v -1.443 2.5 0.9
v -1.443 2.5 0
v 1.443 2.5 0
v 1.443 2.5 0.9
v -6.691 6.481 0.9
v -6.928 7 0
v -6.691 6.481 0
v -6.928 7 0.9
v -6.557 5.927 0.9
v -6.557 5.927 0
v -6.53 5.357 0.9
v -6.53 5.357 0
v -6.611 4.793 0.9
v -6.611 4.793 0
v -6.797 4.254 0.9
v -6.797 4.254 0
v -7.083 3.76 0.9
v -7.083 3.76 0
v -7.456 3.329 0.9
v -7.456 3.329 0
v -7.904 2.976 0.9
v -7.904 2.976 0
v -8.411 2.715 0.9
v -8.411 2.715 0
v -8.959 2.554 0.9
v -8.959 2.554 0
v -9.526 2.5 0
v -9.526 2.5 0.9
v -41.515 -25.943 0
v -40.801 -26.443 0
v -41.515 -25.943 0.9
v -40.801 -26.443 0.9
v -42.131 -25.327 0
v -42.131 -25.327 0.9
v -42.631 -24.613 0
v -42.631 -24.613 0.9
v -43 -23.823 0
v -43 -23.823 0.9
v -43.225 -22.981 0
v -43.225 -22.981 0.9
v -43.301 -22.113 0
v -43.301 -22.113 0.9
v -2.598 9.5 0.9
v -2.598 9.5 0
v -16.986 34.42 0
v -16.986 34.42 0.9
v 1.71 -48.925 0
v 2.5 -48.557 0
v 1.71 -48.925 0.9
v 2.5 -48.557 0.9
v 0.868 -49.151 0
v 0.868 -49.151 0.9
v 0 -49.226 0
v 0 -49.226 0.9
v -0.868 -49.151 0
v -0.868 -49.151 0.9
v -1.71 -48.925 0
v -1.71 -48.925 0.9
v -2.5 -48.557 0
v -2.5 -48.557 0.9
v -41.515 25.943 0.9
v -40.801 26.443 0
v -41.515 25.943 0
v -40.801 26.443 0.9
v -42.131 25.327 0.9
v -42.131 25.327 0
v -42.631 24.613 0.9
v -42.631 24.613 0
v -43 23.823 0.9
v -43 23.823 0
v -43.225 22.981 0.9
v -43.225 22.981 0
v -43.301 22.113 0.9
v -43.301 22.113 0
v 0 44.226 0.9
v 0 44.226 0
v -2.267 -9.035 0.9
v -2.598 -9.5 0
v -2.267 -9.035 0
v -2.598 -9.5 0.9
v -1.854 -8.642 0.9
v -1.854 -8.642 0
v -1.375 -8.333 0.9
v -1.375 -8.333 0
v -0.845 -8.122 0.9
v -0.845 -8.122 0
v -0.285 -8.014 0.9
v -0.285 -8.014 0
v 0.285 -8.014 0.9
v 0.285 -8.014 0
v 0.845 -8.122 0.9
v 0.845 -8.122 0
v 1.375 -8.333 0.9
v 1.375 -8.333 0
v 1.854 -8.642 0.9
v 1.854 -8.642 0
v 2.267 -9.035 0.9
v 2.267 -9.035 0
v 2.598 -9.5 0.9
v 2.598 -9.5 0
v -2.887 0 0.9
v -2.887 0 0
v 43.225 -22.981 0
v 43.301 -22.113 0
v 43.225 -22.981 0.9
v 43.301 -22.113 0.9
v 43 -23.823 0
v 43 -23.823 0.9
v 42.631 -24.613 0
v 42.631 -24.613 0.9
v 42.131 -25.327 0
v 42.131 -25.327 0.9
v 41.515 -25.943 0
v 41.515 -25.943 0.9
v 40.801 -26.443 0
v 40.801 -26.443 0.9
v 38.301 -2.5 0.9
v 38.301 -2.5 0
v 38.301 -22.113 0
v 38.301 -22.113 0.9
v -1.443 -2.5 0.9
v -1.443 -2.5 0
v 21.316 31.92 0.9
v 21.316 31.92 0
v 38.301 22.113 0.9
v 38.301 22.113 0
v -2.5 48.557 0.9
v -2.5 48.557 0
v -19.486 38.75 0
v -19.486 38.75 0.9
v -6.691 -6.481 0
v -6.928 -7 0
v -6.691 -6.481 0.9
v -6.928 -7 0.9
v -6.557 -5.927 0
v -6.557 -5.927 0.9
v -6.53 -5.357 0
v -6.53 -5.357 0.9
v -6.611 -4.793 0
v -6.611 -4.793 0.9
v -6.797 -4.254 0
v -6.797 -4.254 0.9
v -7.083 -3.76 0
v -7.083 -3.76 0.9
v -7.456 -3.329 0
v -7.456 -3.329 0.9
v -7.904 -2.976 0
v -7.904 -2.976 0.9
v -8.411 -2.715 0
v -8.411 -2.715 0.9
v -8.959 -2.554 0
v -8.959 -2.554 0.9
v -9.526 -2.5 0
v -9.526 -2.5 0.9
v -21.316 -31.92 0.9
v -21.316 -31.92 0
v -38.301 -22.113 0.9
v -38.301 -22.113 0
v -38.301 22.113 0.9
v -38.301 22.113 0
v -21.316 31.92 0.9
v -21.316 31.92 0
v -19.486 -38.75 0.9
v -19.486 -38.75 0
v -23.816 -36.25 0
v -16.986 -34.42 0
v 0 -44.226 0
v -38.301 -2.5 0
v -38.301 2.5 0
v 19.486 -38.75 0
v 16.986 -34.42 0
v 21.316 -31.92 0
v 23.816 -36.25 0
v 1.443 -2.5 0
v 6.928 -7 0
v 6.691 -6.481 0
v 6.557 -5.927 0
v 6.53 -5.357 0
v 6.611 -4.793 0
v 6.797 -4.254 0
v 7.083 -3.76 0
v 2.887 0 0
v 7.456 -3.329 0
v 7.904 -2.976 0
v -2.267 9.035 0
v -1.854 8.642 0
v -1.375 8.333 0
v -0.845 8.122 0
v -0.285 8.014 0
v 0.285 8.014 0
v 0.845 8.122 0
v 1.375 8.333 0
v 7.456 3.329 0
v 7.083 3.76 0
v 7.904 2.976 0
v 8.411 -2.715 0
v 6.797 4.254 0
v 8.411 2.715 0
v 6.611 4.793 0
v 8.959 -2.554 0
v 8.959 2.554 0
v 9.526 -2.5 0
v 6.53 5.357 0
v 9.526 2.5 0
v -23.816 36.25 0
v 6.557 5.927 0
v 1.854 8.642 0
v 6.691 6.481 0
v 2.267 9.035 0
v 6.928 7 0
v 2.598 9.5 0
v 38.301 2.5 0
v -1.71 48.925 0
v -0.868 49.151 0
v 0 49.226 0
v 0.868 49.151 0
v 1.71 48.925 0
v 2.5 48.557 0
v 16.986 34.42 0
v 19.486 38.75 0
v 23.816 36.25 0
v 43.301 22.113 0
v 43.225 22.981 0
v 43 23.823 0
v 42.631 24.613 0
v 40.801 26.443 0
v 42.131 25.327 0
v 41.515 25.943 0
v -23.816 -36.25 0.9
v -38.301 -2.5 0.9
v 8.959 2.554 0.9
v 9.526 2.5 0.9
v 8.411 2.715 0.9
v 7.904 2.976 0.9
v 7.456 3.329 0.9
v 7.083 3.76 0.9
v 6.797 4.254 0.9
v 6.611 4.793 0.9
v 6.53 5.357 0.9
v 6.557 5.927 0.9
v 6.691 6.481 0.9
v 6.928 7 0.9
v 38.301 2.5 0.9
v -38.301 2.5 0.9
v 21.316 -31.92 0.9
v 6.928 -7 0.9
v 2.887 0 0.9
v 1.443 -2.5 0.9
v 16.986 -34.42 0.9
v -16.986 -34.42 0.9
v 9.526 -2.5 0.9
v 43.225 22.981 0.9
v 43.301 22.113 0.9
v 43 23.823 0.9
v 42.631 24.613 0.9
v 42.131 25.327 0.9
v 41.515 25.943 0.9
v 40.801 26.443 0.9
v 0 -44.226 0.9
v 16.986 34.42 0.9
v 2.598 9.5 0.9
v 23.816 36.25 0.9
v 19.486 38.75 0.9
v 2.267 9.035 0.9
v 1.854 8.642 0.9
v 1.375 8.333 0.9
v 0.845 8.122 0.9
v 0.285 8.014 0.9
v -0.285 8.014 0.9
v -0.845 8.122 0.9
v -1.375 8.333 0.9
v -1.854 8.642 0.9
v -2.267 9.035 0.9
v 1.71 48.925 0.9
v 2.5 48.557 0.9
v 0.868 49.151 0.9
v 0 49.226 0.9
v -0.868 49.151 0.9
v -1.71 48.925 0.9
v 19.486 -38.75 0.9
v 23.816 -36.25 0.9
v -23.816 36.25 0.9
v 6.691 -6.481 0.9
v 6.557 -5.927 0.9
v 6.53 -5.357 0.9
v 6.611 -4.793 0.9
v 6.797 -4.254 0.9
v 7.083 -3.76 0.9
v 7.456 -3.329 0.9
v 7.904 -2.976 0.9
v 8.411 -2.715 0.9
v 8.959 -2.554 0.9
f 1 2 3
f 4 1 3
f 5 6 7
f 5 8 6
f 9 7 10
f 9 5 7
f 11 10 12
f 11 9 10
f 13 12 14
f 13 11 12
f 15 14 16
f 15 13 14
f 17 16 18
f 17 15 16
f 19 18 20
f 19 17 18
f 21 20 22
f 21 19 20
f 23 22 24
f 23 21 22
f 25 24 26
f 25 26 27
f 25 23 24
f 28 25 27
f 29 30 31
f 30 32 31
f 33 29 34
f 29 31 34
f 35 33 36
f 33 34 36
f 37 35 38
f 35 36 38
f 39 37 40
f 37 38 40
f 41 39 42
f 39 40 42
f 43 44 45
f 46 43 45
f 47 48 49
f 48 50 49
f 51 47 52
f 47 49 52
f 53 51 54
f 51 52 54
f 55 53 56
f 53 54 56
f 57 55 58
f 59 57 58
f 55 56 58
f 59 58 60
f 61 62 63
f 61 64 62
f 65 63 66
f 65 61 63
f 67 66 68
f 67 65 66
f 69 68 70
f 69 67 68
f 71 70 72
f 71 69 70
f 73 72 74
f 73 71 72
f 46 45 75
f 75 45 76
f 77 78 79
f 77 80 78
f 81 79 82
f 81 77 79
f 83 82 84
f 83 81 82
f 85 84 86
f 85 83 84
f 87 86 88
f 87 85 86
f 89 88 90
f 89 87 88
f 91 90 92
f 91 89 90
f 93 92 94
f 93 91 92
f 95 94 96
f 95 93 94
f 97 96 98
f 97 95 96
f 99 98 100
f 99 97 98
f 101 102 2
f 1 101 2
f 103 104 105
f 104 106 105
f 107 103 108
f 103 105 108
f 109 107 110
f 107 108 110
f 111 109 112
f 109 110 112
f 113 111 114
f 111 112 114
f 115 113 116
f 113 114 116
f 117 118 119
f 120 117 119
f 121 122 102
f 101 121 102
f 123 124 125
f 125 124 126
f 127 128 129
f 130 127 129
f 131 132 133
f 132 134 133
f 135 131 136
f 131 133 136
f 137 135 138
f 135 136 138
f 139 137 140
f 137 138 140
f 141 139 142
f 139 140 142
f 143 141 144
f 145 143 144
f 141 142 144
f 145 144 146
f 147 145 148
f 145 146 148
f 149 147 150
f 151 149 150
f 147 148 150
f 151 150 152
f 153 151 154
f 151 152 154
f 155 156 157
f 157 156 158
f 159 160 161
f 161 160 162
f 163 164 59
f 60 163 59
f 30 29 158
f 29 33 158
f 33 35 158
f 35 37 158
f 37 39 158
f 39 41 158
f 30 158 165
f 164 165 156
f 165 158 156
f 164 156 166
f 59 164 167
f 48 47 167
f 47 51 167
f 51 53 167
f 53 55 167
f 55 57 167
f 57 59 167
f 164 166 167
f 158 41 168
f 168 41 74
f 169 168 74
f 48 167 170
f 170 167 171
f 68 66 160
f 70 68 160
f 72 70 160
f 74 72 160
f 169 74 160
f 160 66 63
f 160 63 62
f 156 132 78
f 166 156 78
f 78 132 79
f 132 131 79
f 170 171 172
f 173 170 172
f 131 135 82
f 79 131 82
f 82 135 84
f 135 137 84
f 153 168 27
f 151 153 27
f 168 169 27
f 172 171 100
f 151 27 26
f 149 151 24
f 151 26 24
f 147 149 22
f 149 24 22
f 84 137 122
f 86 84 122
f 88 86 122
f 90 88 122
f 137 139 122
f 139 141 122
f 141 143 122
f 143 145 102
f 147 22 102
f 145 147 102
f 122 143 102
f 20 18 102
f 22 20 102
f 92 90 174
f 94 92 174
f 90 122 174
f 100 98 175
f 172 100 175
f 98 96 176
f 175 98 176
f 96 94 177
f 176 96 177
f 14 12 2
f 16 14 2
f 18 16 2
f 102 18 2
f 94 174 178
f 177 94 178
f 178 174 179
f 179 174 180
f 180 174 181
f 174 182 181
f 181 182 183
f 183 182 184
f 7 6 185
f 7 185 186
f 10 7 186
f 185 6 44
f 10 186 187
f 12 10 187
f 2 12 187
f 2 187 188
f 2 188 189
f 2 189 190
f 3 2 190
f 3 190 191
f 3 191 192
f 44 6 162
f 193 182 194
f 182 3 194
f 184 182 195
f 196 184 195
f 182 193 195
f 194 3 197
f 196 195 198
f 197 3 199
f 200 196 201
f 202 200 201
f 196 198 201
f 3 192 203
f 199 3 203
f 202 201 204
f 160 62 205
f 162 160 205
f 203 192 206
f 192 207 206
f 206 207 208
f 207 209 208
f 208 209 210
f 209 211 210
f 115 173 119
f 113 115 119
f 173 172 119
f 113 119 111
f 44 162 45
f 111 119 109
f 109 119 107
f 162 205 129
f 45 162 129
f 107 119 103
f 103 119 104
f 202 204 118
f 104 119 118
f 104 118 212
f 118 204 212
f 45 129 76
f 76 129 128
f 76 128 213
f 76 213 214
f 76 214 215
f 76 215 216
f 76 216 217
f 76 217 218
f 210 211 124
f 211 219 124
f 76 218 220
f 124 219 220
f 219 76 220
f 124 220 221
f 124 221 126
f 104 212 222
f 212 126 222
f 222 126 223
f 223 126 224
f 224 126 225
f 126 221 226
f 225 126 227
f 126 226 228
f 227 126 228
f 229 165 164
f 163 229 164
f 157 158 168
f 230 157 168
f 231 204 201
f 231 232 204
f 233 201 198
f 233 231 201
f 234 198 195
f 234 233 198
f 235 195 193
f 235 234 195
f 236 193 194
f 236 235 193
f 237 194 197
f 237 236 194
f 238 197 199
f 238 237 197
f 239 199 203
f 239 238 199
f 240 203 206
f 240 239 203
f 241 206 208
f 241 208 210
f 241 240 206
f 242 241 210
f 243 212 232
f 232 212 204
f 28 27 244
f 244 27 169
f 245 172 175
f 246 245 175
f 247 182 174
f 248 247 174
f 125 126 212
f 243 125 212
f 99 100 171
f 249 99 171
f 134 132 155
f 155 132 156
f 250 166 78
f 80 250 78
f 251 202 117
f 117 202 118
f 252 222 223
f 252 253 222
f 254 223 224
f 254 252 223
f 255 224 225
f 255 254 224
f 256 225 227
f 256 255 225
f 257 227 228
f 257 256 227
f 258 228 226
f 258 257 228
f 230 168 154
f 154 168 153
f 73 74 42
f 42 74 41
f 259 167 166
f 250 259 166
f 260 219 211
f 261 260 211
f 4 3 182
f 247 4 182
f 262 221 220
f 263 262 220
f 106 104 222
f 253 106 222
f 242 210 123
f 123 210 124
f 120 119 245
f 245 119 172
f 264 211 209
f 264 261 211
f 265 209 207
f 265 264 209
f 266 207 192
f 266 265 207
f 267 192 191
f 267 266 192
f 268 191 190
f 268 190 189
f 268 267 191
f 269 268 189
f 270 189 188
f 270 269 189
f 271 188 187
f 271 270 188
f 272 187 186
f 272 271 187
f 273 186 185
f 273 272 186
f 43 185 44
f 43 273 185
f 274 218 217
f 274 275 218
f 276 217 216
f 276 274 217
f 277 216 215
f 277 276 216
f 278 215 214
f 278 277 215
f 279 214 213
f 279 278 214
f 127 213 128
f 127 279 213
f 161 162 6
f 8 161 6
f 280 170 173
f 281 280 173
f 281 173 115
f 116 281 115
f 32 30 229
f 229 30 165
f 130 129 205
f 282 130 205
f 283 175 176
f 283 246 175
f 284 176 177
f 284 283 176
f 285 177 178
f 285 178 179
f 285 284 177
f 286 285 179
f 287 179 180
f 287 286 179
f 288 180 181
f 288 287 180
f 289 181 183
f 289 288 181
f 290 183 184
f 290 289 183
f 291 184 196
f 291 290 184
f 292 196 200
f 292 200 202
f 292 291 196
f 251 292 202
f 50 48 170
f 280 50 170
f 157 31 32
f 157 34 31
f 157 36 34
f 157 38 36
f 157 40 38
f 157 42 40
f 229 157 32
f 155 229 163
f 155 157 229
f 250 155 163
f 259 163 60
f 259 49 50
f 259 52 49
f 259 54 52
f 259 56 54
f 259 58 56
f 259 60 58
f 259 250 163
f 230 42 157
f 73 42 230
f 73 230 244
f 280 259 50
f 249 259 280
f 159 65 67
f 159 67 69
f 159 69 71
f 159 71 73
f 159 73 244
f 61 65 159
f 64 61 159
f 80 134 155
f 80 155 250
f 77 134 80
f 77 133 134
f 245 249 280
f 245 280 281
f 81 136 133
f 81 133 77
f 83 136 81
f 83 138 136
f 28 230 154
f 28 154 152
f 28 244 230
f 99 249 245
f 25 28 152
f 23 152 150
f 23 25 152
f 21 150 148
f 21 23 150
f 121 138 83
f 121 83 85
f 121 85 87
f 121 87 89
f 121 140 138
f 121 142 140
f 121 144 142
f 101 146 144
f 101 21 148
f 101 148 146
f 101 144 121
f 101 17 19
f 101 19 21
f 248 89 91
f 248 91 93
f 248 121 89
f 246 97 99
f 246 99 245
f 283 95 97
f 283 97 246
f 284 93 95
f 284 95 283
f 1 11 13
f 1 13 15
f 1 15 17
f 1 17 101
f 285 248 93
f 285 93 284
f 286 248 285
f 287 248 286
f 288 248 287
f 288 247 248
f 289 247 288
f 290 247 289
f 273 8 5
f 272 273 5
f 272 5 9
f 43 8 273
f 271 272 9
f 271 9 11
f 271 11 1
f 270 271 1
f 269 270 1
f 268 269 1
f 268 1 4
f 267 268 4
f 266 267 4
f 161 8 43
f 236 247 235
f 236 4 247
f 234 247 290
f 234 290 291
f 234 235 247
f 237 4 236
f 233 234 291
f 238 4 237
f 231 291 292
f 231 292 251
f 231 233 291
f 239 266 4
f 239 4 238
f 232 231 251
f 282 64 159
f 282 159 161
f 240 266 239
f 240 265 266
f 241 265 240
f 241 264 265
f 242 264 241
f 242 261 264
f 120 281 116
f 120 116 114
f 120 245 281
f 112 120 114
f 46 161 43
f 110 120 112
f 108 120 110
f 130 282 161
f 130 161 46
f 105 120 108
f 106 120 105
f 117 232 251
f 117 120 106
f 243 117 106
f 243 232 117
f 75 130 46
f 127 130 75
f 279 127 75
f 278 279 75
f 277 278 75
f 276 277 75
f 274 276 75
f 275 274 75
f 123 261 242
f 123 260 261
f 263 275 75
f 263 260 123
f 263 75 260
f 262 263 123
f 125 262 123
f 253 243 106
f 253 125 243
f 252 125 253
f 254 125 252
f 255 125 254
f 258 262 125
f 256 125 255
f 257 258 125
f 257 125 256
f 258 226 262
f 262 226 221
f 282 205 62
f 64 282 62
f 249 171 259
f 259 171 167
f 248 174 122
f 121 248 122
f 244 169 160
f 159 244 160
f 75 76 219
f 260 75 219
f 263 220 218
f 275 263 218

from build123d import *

# Parameters (mm, degrees)
F1_DEPTH = 0.9
F2_R     = 5
F4_DEPTH = 0.9
F5_R     = 3


with BuildPart() as f1:
    # F0 (on Top) → F1 (new body)
    with BuildSketch(Plane.XY):
        Polygon((43.3012701892, -25), (43.3012701892, 25), (0, 50), (-43.3012701892, 25), (-43.3012701892, -25), (0, -50), align=None)
        Polygon((0, 44.2264973081), (38.3012701892, 22.1132486541), (38.3012701892, -22.1132486541), (0, -44.2264973081), (-38.3012701892, -22.1132486541), (-38.3012701892, 22.1132486541), align=None, mode=Mode.SUBTRACT)
    extrude(amount=F1_DEPTH)

    # F2
    f2_edges = [f1.edges().sort_by_distance(p)[0] for p in [
        (0, 50, 0.45),
        (43.30127, 25, 0.45),
        (-43.30127, 25, 0.45),
        (-43.30127, -25, 0.45),
        (0, -50, 0.45),
        (43.30127, -25, 0.45),
    ]]
    fillet(f2_edges, radius=F2_R)

    # F3 (on Top) → F4 (join, through all)
    with BuildSketch(Plane.XY):
        Polygon((0, 5), (-19.4855715851, 38.75), (-23.8156986041, 36.25), (-4.3301270189, 2.5), (-1.443375673, 2.5), align=None)
        Polygon((19.4855715851, 38.75), (0, 5), (1.443375673, 2.5), (4.3301270189, 2.5), (23.8156986041, 36.25), align=None)
        Polygon((1.443375673, 2.5), (0, 5), (-1.443375673, 2.5), align=None)
        Polygon((-1.443375673, 2.5), (-4.3301270189, 2.5), (-2.8867513459, 0), align=None)
        Polygon((-2.8867513459, 0), (-4.3301270189, 2.5), (-43.3012701892, 2.5), (-43.3012701892, -2.5), (-4.3301270189, -2.5), align=None)
        Polygon((4.3301270189, 2.5), (1.443375673, 2.5), (2.8867513459, 0), align=None)
        Polygon((-1.443375673, -2.5), (-2.8867513459, 0), (-4.3301270189, -2.5), align=None)
        Polygon((4.3301270189, 2.5), (2.8867513459, 0), (4.3301270189, -2.5), (43.3012701892, -2.5), (43.3012701892, 2.5), align=None)
        Polygon((4.3301270189, -2.5), (2.8867513459, 0), (1.443375673, -2.5), align=None)
        Polygon((1.443375673, -2.5), (-1.443375673, -2.5), (0, -5), align=None)
        Polygon((0, -5), (-1.443375673, -2.5), (-4.3301270189, -2.5), (-23.8156986041, -36.25), (-19.4855715851, -38.75), align=None)
        Polygon((23.8156986041, -36.25), (4.3301270189, -2.5), (1.443375673, -2.5), (0, -5), (19.4855715851, -38.75), align=None)
    extrude(amount=F4_DEPTH)

    # F5
    f5_edges = [f1.edges().sort_by_distance(p)[0] for p in [
        (-4.330127, -2.5, 0.45),
        (-4.330127, 2.5, 0.45),
        (0, 5, 0.45),
        (0, -5, 0.45),
        (4.330127, -2.5, 0.45),
        (4.330127, 2.5, 0.45),
    ]]
    fillet(f5_edges, radius=F5_R)


solid = f1.part
